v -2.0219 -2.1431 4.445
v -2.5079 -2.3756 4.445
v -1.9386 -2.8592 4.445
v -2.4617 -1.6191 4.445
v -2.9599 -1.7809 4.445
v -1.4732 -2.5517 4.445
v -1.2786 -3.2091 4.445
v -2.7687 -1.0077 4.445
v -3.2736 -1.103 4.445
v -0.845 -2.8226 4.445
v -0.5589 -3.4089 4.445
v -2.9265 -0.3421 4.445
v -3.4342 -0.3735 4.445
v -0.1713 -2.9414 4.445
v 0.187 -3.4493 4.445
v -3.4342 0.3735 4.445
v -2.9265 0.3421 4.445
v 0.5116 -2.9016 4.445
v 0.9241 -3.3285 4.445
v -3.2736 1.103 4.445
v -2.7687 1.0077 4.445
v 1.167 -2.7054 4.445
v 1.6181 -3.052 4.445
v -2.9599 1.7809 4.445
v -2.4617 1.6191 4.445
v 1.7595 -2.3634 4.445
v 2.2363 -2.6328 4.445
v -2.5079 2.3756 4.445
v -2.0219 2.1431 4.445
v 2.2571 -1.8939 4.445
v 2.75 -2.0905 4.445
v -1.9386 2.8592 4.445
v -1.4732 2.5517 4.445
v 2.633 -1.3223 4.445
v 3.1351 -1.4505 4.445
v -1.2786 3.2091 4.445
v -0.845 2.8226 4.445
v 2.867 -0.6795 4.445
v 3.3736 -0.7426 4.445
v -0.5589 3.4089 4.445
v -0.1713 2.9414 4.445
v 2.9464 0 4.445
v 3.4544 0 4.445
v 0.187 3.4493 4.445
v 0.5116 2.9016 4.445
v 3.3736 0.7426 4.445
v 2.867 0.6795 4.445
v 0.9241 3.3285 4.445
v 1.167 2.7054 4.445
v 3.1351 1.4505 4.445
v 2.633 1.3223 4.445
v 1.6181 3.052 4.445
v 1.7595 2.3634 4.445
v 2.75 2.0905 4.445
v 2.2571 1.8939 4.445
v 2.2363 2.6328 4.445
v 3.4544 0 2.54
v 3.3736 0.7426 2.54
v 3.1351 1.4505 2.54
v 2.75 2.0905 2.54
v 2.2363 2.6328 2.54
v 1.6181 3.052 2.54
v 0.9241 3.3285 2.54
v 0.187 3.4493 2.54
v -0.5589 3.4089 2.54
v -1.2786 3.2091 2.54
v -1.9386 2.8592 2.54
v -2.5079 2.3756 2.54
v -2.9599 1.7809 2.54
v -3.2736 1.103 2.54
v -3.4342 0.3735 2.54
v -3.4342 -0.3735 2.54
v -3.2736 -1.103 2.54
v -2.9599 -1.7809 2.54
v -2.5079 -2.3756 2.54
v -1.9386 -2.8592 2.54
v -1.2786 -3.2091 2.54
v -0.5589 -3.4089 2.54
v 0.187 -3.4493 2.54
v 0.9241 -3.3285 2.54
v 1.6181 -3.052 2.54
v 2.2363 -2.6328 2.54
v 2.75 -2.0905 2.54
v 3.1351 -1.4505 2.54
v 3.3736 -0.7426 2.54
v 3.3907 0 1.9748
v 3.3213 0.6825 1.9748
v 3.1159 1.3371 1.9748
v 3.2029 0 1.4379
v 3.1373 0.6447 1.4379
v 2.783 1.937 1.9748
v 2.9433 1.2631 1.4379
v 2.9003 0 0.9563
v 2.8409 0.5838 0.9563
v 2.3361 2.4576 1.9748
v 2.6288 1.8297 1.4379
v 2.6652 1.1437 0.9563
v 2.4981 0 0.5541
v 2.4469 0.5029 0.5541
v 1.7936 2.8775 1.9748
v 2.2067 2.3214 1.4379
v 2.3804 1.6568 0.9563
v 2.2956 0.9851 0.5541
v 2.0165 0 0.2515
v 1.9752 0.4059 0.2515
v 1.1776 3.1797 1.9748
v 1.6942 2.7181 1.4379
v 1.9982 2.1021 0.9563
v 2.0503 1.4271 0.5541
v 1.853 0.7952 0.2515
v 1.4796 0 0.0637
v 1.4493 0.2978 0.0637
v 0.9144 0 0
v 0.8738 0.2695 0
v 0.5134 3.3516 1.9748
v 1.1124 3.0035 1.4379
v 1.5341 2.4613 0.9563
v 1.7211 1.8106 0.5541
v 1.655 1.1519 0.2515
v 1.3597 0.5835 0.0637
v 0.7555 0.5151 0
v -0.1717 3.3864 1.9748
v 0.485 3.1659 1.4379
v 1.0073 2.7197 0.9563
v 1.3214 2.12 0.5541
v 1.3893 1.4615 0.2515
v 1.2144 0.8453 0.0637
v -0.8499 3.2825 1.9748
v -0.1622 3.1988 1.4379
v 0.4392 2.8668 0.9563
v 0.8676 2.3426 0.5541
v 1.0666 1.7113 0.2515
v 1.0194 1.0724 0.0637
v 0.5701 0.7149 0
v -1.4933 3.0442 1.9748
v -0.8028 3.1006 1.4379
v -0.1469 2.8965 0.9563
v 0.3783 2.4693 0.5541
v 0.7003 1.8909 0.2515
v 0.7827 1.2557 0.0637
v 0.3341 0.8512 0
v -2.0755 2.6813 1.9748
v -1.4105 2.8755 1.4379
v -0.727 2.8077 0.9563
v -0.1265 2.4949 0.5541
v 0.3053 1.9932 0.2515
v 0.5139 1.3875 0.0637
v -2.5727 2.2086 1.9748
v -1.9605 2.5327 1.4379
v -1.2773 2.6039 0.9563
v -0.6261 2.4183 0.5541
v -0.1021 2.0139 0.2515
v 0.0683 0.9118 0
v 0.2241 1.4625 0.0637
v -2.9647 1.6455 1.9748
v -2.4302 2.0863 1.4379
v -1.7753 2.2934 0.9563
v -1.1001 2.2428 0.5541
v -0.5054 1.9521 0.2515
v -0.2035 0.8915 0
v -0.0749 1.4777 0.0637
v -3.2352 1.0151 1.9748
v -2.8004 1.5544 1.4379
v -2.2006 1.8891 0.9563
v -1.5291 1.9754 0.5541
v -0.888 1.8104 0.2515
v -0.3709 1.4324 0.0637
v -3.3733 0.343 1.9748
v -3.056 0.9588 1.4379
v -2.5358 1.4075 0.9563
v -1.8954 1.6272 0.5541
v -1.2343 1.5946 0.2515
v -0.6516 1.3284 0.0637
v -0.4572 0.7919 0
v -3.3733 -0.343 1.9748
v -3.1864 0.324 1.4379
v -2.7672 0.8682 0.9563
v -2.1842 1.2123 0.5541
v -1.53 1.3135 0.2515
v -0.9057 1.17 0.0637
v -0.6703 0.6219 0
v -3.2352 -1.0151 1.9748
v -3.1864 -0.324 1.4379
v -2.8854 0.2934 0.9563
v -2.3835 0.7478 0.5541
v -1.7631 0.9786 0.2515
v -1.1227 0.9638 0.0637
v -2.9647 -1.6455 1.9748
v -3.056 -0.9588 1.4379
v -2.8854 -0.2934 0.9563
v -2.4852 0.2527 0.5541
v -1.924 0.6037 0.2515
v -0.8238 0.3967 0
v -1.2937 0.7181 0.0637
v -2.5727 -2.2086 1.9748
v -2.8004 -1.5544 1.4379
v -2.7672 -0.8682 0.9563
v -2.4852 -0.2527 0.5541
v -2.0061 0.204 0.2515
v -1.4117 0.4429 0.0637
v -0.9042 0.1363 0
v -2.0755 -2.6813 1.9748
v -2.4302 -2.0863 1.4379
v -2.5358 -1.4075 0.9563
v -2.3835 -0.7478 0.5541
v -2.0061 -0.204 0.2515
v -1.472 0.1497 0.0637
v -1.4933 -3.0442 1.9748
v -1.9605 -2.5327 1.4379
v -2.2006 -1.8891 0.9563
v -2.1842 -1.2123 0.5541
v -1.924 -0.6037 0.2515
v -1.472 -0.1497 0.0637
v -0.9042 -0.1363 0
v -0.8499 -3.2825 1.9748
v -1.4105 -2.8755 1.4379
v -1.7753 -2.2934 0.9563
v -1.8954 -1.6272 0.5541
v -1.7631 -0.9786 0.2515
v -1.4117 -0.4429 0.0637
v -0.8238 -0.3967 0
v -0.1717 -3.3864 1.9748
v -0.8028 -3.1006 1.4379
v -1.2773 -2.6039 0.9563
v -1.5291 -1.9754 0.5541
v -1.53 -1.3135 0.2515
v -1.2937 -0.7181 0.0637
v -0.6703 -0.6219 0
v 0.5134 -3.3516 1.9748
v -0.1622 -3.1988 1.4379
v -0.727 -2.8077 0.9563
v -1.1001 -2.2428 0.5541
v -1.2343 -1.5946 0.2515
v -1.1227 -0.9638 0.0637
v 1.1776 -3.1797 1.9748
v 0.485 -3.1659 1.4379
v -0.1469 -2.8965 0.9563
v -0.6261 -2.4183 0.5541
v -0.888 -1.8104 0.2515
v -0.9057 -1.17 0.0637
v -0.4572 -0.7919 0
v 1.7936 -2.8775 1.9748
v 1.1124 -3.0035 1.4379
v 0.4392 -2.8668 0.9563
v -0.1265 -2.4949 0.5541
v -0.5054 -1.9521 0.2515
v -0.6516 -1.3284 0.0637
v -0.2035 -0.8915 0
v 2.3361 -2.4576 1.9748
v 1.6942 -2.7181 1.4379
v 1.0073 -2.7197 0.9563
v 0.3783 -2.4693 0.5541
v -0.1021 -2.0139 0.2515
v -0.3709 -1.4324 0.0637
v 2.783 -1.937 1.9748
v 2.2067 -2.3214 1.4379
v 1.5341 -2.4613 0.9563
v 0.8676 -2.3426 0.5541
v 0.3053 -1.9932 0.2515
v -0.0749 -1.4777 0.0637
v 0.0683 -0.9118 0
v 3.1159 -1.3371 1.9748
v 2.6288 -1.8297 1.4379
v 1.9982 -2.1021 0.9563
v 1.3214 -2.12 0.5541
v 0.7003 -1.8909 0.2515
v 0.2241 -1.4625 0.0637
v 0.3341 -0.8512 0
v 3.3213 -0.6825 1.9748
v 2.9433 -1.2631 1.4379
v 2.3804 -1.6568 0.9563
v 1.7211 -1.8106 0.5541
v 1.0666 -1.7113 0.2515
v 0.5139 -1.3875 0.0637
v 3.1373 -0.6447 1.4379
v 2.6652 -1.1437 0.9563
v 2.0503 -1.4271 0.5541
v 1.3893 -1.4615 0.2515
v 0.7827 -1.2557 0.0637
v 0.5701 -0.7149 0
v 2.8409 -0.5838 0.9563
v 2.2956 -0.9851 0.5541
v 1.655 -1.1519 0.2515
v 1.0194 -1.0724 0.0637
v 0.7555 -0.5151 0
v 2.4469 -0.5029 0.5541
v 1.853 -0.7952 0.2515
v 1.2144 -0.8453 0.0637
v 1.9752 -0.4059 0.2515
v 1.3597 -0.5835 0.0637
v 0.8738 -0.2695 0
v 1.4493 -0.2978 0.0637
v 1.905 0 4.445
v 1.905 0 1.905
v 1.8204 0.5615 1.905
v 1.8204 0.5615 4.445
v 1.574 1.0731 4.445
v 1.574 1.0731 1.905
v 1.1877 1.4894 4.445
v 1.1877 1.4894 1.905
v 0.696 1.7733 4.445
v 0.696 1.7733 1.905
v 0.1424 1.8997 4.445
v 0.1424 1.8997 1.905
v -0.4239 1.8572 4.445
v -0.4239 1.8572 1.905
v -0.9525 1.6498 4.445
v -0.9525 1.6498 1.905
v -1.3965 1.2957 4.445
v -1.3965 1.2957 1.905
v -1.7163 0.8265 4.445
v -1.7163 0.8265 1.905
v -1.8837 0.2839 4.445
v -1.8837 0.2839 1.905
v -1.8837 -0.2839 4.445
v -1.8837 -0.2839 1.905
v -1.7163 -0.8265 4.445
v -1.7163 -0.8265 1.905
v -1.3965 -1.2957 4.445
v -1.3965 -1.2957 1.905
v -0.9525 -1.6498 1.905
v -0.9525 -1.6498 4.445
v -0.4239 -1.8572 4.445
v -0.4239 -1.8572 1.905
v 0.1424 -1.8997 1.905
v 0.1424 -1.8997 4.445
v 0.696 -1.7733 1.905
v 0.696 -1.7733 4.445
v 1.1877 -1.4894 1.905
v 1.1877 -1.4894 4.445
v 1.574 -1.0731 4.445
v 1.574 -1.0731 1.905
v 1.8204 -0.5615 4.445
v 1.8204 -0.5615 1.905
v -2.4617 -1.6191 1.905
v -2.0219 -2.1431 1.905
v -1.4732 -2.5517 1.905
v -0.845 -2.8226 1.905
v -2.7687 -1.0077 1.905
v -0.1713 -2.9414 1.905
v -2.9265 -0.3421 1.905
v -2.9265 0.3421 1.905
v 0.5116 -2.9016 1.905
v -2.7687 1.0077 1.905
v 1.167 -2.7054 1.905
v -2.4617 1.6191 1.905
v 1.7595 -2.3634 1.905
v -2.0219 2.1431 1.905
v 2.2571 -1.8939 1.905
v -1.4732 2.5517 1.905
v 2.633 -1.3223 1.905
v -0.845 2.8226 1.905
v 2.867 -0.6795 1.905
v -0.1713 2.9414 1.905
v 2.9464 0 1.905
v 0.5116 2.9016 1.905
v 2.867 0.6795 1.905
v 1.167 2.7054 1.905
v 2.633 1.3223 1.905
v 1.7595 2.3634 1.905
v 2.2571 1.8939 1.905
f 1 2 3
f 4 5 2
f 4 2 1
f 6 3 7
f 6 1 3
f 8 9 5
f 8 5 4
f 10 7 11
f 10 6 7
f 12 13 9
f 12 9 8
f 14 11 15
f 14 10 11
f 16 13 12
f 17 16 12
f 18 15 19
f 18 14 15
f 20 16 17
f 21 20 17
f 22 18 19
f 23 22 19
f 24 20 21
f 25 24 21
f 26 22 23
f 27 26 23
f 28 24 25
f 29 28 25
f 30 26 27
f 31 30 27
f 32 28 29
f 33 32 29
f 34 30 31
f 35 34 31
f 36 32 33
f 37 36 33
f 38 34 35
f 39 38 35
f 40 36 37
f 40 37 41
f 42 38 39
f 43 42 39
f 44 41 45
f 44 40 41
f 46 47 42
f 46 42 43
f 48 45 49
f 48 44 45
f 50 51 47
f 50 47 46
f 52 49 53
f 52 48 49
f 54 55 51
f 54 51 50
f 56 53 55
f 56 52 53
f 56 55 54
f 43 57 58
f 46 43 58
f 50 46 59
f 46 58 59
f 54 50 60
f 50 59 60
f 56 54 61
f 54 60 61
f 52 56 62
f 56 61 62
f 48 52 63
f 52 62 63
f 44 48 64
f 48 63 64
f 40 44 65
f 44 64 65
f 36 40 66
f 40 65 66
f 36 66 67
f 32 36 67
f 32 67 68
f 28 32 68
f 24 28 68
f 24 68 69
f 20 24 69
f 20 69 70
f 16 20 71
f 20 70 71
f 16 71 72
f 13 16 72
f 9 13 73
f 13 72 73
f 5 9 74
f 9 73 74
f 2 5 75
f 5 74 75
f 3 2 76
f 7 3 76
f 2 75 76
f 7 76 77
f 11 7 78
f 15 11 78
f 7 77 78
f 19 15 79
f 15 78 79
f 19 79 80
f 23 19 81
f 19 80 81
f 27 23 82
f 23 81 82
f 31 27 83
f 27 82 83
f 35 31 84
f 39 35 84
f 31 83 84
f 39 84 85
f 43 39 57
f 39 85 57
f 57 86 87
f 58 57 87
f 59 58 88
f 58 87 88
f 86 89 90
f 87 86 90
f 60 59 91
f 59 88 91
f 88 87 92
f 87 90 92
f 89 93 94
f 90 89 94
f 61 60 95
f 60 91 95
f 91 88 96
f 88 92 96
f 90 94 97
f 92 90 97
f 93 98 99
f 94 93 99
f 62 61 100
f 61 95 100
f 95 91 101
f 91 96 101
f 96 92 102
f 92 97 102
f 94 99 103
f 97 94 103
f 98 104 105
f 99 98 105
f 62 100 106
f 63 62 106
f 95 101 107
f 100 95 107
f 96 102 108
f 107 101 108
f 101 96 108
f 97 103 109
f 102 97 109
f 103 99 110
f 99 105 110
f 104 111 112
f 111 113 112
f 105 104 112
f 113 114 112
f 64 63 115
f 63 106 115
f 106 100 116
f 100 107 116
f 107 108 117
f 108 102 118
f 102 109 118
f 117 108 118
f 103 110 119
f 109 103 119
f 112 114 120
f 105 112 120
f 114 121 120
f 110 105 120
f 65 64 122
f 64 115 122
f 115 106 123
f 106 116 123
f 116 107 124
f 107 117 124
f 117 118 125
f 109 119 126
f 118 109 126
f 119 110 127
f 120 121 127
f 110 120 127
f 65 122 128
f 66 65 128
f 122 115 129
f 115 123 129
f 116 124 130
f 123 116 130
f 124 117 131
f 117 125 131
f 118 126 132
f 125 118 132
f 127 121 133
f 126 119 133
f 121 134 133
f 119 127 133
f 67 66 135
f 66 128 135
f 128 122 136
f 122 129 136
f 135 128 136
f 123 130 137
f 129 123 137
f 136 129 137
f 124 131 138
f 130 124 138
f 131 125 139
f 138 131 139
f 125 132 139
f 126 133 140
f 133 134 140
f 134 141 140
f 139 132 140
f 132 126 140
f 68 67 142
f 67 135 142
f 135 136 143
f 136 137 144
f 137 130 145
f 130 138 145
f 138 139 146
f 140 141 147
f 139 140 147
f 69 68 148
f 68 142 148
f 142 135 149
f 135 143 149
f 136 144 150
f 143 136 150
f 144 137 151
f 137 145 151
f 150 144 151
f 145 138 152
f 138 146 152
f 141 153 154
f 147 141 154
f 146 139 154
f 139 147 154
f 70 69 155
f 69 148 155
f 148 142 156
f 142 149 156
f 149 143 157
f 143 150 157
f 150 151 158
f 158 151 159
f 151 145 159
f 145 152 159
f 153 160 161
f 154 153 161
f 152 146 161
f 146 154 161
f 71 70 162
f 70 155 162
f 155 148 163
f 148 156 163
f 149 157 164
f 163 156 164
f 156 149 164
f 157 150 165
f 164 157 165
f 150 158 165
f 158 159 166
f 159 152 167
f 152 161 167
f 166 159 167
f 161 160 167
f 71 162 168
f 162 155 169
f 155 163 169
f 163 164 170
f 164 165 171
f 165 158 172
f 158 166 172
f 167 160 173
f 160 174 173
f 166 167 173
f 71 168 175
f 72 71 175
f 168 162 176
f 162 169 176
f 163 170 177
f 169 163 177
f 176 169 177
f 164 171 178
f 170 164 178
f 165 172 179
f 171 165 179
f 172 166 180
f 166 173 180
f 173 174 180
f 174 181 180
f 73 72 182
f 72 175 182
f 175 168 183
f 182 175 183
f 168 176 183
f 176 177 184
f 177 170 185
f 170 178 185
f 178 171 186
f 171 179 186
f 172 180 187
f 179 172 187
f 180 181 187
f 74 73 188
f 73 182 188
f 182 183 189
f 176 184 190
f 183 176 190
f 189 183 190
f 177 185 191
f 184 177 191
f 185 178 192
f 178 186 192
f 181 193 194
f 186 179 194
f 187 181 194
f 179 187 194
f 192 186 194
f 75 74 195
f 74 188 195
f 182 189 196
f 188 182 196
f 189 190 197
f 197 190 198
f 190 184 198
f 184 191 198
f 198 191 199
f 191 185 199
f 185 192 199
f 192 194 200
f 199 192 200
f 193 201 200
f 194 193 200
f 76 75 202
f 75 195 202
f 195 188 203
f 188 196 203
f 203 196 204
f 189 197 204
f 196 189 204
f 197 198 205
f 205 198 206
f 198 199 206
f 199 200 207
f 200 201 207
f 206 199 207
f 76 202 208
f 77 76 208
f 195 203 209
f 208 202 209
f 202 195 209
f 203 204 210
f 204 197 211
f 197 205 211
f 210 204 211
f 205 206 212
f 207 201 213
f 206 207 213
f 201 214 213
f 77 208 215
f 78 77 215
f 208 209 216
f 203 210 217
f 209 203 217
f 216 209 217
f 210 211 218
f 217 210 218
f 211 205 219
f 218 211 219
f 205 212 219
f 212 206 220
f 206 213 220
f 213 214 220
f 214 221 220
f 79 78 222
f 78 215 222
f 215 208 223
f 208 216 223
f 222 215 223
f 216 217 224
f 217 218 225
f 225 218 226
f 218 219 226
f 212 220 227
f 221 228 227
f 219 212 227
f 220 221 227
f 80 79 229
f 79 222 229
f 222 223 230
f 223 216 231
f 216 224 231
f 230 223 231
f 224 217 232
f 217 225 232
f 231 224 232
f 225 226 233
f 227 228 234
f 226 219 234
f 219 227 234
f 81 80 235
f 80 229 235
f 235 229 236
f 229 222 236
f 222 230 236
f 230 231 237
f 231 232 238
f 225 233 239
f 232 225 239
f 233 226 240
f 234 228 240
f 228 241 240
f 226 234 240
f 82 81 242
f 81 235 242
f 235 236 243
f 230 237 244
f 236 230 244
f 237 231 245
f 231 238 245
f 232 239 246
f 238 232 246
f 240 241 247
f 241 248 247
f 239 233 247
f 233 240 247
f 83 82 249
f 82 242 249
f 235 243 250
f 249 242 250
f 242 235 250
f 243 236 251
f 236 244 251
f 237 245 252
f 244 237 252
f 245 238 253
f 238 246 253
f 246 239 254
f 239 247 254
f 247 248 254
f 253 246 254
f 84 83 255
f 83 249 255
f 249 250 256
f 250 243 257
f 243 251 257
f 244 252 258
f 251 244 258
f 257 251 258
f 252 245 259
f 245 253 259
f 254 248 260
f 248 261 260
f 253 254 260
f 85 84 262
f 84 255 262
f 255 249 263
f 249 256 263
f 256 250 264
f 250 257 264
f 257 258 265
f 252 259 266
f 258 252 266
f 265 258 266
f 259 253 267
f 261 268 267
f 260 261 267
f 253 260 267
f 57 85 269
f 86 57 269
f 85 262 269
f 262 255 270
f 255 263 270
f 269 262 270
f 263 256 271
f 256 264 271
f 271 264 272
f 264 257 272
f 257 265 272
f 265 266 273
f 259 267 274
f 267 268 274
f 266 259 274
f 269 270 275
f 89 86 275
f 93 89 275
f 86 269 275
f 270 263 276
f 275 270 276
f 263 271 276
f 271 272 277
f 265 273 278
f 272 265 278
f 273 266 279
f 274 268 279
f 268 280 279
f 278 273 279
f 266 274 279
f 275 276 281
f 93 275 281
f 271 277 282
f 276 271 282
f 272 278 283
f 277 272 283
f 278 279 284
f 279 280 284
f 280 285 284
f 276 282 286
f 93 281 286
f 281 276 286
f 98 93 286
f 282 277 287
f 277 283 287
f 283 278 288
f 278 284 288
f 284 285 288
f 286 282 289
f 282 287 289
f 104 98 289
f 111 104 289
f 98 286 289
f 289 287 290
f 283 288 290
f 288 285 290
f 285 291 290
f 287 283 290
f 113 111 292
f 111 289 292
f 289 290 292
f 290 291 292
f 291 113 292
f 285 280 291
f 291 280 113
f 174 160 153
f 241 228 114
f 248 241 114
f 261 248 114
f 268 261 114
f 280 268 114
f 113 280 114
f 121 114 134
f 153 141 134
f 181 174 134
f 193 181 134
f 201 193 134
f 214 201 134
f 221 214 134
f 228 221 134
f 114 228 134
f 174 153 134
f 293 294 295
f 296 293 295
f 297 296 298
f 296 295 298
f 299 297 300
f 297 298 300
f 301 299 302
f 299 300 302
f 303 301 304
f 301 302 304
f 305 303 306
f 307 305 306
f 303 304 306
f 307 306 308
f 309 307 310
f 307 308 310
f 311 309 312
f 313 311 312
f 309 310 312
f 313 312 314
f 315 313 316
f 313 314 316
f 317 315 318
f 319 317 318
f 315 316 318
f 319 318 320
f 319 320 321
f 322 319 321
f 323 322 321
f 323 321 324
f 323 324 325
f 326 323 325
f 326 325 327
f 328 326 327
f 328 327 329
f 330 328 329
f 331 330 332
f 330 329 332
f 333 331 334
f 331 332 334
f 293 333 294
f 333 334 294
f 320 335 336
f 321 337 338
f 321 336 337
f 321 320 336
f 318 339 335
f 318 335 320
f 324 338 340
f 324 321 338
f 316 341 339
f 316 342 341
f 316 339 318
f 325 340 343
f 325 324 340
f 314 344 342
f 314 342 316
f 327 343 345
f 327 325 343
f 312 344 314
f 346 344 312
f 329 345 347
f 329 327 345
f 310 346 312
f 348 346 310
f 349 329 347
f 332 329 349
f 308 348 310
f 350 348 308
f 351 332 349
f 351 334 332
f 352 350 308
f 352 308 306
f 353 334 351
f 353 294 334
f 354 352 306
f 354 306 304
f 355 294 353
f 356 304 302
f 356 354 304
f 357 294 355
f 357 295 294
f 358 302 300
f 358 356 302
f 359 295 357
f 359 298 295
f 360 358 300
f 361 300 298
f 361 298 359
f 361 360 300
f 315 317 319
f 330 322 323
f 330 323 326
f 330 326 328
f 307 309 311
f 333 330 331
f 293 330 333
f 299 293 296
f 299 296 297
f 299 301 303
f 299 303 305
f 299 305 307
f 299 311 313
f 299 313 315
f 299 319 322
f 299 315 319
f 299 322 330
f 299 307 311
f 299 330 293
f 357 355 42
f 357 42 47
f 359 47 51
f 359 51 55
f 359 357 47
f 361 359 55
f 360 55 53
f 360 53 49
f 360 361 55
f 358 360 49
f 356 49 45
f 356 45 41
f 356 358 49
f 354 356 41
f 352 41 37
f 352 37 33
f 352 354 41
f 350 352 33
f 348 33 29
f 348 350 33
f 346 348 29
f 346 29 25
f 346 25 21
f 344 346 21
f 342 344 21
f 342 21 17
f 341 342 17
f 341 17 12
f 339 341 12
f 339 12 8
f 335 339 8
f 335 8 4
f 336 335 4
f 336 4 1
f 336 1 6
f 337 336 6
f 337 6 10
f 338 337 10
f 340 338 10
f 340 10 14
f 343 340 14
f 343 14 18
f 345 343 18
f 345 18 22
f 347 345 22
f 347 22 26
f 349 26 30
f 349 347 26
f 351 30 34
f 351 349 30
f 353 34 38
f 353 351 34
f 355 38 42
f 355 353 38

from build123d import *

# Parameters (mm, degrees)
F0_R     = 3.4544
F0_R_2   = 2.9464
F1_DEPTH = 4.445
F2_DEPTH = 1.905
F3_R     = 1.905
F4_DEPTH = 2.54
F5_R     = 2.54


with BuildPart() as f1:
    # F0 (on Top) → F1 (new body)
    with BuildSketch(Plane.XY):
        Circle(F0_R)
        Circle(F0_R_2, mode=Mode.SUBTRACT)
    extrude(amount=F1_DEPTH)

    # F0 (on Top) → F2 (join)
    with BuildSketch(Plane.XY):
        Circle(F0_R)
        Circle(F0_R_2, mode=Mode.SUBTRACT)
        Circle(F0_R_2)
    extrude(amount=F2_DEPTH)

    # F3 (on face) → F4 (join)
    with BuildSketch(Plane.XY.offset(1.905)):
        Circle(F3_R)
    extrude(amount=F4_DEPTH)

    # F5
    f5_edges = [f1.edges().sort_by_distance(p)[0] for p in [
        (-3.4544, 0, 0),
    ]]
    fillet(f5_edges, radius=F5_R)


solid = f1.part
